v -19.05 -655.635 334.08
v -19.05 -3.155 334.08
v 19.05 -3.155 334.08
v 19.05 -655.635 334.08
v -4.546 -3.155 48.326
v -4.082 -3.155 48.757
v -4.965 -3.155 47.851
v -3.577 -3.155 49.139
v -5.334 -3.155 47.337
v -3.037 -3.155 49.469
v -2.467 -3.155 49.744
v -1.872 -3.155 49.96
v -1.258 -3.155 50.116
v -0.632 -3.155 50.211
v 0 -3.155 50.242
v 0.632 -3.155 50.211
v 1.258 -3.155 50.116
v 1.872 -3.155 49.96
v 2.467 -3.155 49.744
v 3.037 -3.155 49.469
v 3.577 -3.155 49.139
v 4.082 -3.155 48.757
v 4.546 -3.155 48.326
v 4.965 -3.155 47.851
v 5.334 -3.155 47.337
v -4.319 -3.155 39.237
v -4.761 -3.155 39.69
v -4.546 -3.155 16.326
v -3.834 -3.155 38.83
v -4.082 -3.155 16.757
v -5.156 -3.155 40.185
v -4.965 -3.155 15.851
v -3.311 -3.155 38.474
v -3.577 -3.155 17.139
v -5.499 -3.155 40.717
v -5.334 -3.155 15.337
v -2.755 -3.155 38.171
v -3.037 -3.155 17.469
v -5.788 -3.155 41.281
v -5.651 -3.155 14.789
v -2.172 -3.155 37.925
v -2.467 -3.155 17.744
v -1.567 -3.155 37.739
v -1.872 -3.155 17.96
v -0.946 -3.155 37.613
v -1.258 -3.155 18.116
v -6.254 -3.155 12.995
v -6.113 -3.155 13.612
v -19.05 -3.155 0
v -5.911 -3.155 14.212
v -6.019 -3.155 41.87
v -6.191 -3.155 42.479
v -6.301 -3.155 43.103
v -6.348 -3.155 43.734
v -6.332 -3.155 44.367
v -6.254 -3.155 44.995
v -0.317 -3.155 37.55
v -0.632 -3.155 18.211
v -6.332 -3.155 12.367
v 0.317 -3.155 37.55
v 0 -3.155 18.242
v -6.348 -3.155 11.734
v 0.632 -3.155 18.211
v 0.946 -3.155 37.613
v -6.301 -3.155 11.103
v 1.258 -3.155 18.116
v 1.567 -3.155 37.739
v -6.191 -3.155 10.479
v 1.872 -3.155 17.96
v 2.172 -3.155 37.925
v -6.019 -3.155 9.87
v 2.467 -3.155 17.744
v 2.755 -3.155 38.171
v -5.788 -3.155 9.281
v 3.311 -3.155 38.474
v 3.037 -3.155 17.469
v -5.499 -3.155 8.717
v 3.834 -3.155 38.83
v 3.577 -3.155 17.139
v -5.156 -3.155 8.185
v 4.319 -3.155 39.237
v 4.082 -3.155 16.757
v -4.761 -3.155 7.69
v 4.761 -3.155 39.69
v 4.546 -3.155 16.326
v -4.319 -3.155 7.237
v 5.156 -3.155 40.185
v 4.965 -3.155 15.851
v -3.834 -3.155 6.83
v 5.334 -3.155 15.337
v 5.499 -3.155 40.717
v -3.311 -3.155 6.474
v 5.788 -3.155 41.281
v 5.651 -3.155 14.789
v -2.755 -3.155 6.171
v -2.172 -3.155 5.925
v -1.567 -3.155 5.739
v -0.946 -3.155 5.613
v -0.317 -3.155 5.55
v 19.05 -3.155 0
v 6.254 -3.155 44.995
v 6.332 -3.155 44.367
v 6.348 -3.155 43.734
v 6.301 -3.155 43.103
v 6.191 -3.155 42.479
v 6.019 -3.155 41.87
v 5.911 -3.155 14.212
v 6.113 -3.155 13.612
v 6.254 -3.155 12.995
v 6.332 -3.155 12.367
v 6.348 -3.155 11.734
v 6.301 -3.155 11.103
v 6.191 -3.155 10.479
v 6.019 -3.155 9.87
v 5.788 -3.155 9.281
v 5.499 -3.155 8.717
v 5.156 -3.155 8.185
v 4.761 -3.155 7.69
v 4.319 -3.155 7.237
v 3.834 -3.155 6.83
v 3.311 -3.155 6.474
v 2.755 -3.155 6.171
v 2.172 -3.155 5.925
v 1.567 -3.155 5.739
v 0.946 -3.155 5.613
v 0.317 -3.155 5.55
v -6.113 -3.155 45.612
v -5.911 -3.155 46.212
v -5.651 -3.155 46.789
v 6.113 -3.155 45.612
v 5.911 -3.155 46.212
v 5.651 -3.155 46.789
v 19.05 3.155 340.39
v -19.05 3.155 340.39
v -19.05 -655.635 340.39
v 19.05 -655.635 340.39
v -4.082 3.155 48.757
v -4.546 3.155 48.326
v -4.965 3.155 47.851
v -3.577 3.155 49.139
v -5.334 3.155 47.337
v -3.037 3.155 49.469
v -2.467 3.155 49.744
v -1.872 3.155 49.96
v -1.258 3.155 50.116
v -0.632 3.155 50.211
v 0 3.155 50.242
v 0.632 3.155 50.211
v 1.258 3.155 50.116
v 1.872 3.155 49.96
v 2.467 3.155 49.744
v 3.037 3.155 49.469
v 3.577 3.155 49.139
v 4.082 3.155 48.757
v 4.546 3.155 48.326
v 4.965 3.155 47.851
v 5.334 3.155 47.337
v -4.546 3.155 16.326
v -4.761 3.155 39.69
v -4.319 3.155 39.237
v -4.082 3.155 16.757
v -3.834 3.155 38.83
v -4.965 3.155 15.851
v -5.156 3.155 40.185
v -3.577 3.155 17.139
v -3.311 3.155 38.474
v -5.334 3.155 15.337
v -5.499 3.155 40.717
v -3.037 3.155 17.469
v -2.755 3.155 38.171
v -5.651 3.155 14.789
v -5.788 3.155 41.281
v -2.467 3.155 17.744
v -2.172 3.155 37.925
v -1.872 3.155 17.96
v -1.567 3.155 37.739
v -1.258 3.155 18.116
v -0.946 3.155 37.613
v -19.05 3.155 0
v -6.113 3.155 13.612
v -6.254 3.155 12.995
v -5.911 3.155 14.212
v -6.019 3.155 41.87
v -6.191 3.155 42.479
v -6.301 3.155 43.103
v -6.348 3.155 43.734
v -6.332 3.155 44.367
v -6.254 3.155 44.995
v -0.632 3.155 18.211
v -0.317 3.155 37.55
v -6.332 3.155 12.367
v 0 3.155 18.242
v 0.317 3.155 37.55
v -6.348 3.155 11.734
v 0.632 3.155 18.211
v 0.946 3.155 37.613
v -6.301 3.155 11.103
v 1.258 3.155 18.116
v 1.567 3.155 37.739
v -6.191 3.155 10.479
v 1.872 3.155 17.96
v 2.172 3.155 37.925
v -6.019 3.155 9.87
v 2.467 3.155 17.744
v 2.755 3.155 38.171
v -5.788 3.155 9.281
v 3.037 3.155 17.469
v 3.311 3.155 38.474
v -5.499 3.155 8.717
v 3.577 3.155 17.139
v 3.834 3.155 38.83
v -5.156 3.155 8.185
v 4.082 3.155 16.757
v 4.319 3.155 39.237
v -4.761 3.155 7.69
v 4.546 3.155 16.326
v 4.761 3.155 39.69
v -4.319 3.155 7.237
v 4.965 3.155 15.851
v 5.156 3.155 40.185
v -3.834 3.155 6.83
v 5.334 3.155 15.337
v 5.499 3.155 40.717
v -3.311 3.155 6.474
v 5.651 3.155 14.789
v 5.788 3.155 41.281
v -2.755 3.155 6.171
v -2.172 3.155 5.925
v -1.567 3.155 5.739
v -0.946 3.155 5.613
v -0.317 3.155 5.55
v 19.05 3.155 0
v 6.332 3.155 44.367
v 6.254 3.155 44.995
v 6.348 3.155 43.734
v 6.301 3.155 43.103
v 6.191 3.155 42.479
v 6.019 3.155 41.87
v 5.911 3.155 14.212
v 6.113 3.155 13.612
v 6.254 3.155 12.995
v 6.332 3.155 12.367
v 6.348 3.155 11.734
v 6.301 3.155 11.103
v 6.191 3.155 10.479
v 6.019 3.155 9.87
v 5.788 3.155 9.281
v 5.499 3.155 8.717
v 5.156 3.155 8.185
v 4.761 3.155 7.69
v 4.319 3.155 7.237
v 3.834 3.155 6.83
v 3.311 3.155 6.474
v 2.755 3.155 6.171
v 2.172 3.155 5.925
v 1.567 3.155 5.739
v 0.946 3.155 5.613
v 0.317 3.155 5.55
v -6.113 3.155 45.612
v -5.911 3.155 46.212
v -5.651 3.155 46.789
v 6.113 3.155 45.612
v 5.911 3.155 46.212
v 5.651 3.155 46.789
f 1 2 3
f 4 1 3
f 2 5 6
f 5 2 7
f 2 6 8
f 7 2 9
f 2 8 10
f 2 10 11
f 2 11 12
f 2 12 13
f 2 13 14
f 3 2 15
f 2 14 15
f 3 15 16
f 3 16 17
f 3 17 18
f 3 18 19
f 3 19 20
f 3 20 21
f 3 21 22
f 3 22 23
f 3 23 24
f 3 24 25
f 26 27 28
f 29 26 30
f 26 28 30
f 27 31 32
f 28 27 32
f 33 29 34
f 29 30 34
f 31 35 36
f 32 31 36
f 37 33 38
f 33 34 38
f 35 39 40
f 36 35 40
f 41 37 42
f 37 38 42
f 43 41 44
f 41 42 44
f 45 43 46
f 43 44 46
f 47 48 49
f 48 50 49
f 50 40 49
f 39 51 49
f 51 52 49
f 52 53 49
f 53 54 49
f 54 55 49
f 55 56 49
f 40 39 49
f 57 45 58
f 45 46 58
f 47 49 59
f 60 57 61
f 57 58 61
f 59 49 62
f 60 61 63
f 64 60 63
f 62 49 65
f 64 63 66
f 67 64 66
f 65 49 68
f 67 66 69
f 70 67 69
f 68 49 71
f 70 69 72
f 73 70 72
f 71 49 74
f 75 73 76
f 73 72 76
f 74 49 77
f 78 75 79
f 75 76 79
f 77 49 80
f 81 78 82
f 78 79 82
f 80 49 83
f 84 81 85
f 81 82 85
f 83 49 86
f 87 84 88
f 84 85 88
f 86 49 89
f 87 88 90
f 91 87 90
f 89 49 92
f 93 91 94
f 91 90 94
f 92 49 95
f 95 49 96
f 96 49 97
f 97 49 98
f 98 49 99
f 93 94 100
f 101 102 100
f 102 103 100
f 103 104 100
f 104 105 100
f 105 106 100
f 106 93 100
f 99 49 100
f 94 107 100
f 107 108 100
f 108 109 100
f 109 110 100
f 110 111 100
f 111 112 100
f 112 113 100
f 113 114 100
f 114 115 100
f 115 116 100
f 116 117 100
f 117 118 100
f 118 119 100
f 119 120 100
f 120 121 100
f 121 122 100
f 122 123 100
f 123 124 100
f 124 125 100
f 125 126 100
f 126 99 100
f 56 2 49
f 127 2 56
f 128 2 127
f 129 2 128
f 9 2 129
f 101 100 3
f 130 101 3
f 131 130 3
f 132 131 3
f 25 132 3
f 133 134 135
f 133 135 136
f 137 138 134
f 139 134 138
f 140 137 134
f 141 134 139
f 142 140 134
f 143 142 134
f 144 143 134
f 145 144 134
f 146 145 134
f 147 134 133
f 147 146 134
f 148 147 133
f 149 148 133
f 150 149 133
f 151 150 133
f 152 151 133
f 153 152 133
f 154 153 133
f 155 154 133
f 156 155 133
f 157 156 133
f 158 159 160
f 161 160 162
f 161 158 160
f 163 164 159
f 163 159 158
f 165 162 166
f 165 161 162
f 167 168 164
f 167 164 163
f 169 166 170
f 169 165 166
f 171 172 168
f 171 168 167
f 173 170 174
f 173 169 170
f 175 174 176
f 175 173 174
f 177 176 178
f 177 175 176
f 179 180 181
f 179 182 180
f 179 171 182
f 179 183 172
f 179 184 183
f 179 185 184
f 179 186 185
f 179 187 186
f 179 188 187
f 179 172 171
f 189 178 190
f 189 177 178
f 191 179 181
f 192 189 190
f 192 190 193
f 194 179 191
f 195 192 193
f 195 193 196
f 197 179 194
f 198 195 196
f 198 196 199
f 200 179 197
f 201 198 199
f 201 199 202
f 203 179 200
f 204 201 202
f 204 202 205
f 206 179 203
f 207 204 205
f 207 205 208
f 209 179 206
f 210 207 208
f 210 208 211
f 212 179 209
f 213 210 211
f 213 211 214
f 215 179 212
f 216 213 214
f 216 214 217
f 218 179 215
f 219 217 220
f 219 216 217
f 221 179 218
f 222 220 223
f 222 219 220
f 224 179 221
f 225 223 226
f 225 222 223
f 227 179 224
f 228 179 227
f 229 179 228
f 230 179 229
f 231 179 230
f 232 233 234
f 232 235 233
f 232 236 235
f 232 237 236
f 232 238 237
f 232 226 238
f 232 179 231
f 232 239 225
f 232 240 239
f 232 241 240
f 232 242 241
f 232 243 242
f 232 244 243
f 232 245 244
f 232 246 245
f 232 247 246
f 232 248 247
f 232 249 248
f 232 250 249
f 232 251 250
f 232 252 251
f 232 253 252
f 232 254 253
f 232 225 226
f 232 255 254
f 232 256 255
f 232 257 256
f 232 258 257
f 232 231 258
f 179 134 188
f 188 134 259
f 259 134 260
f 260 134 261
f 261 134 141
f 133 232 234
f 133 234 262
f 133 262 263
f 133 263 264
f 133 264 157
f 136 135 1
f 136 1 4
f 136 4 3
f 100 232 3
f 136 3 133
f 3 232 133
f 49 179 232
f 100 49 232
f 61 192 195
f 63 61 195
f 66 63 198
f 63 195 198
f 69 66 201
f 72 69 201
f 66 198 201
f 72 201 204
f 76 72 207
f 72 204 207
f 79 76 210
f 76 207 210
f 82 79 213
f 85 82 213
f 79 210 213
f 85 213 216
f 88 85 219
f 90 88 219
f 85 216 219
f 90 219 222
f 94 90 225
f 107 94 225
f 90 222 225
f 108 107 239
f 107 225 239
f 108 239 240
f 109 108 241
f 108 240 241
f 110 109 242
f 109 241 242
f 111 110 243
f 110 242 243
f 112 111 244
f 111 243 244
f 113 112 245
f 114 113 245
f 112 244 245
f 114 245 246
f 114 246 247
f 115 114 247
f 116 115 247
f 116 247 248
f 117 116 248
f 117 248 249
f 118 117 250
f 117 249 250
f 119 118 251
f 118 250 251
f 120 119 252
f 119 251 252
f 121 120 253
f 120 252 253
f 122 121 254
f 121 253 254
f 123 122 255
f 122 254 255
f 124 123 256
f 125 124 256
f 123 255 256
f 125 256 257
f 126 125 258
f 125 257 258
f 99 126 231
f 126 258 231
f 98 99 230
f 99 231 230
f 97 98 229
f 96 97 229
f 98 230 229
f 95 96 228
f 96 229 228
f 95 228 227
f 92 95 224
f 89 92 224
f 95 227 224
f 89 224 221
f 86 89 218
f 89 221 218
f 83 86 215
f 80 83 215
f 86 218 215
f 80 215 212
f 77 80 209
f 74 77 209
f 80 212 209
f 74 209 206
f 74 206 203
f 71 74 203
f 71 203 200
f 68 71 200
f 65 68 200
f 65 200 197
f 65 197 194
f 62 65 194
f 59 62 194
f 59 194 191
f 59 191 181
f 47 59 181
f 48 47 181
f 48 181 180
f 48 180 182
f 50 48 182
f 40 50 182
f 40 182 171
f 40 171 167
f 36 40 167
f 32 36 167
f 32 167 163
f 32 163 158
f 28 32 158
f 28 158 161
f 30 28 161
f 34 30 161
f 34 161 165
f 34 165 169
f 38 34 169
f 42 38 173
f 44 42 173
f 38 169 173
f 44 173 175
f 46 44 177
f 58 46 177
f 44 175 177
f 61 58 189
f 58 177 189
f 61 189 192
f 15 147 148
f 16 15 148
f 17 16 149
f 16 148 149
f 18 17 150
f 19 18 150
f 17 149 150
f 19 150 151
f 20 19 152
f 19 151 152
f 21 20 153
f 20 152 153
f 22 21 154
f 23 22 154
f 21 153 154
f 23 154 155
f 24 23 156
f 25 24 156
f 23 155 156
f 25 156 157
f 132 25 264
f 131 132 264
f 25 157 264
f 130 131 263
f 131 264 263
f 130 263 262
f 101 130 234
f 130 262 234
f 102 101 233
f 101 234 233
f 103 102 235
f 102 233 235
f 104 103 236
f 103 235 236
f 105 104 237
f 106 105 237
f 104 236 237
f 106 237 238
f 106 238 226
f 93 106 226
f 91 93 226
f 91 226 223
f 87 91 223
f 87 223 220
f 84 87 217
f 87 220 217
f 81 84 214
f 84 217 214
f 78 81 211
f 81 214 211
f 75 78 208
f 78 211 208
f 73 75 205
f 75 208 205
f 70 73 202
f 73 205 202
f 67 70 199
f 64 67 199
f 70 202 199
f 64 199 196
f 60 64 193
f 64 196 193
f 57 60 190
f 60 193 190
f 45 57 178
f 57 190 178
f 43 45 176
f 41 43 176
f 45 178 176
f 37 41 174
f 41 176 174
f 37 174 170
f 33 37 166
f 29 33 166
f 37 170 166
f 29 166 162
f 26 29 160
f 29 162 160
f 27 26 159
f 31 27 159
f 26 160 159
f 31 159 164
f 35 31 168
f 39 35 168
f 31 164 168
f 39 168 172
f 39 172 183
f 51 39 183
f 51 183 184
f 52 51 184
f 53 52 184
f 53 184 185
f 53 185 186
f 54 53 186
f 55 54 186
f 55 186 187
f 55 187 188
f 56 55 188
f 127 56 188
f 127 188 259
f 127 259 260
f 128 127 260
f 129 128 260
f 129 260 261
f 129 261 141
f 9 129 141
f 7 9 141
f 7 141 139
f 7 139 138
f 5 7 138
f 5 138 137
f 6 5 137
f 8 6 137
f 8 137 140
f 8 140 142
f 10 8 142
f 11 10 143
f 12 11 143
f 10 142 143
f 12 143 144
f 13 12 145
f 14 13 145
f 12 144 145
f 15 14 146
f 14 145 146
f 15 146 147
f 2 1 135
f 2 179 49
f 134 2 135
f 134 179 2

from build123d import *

# Parameters (mm, degrees)
CROQUIS1_W              = 38.1
CROQUIS1_H              = 6.31
SALIENTE_EXTRUIR1_DEPTH = 340.39
CROQUIS3_W              = 38.1
CROQUIS3_H              = 6.31
SALIENTE_EXTRUIR2_DEPTH = 652.48
CROQUIS5_R              = 6.35
CORTAR_EXTRUIR1_DEPTH   = 6.31


with BuildPart() as part:
    # Croquis1 → Saliente-Extruir1 (new body)
    with BuildSketch(Plane.XY):
        Rectangle(CROQUIS1_W, CROQUIS1_H)
    extrude(amount=SALIENTE_EXTRUIR1_DEPTH)

    # Croquis3 → Saliente-Extruir2 (add)
    with BuildSketch(Plane.XZ.offset(3.155)):
        with Locations((0, 337.235)):
            Rectangle(CROQUIS3_W, CROQUIS3_H)
    extrude(amount=SALIENTE_EXTRUIR2_DEPTH)

    # Croquis5 → Cortar-Extruir1 (cut)
    with BuildSketch(Plane(origin=(0, 3.155, 0), x_dir=(1, 0, 0), z_dir=(0, 1, 0))):
        with Locations(Location((0, -43.892204666, 0), (0, 0, 270))):
            Circle(CROQUIS5_R)
        with Locations(Location((0, -11.892204666, 0), (0, 0, 270))):
            Circle(CROQUIS5_R)
    extrude(amount=-CORTAR_EXTRUIR1_DEPTH, mode=Mode.SUBTRACT)


solid = part.part
